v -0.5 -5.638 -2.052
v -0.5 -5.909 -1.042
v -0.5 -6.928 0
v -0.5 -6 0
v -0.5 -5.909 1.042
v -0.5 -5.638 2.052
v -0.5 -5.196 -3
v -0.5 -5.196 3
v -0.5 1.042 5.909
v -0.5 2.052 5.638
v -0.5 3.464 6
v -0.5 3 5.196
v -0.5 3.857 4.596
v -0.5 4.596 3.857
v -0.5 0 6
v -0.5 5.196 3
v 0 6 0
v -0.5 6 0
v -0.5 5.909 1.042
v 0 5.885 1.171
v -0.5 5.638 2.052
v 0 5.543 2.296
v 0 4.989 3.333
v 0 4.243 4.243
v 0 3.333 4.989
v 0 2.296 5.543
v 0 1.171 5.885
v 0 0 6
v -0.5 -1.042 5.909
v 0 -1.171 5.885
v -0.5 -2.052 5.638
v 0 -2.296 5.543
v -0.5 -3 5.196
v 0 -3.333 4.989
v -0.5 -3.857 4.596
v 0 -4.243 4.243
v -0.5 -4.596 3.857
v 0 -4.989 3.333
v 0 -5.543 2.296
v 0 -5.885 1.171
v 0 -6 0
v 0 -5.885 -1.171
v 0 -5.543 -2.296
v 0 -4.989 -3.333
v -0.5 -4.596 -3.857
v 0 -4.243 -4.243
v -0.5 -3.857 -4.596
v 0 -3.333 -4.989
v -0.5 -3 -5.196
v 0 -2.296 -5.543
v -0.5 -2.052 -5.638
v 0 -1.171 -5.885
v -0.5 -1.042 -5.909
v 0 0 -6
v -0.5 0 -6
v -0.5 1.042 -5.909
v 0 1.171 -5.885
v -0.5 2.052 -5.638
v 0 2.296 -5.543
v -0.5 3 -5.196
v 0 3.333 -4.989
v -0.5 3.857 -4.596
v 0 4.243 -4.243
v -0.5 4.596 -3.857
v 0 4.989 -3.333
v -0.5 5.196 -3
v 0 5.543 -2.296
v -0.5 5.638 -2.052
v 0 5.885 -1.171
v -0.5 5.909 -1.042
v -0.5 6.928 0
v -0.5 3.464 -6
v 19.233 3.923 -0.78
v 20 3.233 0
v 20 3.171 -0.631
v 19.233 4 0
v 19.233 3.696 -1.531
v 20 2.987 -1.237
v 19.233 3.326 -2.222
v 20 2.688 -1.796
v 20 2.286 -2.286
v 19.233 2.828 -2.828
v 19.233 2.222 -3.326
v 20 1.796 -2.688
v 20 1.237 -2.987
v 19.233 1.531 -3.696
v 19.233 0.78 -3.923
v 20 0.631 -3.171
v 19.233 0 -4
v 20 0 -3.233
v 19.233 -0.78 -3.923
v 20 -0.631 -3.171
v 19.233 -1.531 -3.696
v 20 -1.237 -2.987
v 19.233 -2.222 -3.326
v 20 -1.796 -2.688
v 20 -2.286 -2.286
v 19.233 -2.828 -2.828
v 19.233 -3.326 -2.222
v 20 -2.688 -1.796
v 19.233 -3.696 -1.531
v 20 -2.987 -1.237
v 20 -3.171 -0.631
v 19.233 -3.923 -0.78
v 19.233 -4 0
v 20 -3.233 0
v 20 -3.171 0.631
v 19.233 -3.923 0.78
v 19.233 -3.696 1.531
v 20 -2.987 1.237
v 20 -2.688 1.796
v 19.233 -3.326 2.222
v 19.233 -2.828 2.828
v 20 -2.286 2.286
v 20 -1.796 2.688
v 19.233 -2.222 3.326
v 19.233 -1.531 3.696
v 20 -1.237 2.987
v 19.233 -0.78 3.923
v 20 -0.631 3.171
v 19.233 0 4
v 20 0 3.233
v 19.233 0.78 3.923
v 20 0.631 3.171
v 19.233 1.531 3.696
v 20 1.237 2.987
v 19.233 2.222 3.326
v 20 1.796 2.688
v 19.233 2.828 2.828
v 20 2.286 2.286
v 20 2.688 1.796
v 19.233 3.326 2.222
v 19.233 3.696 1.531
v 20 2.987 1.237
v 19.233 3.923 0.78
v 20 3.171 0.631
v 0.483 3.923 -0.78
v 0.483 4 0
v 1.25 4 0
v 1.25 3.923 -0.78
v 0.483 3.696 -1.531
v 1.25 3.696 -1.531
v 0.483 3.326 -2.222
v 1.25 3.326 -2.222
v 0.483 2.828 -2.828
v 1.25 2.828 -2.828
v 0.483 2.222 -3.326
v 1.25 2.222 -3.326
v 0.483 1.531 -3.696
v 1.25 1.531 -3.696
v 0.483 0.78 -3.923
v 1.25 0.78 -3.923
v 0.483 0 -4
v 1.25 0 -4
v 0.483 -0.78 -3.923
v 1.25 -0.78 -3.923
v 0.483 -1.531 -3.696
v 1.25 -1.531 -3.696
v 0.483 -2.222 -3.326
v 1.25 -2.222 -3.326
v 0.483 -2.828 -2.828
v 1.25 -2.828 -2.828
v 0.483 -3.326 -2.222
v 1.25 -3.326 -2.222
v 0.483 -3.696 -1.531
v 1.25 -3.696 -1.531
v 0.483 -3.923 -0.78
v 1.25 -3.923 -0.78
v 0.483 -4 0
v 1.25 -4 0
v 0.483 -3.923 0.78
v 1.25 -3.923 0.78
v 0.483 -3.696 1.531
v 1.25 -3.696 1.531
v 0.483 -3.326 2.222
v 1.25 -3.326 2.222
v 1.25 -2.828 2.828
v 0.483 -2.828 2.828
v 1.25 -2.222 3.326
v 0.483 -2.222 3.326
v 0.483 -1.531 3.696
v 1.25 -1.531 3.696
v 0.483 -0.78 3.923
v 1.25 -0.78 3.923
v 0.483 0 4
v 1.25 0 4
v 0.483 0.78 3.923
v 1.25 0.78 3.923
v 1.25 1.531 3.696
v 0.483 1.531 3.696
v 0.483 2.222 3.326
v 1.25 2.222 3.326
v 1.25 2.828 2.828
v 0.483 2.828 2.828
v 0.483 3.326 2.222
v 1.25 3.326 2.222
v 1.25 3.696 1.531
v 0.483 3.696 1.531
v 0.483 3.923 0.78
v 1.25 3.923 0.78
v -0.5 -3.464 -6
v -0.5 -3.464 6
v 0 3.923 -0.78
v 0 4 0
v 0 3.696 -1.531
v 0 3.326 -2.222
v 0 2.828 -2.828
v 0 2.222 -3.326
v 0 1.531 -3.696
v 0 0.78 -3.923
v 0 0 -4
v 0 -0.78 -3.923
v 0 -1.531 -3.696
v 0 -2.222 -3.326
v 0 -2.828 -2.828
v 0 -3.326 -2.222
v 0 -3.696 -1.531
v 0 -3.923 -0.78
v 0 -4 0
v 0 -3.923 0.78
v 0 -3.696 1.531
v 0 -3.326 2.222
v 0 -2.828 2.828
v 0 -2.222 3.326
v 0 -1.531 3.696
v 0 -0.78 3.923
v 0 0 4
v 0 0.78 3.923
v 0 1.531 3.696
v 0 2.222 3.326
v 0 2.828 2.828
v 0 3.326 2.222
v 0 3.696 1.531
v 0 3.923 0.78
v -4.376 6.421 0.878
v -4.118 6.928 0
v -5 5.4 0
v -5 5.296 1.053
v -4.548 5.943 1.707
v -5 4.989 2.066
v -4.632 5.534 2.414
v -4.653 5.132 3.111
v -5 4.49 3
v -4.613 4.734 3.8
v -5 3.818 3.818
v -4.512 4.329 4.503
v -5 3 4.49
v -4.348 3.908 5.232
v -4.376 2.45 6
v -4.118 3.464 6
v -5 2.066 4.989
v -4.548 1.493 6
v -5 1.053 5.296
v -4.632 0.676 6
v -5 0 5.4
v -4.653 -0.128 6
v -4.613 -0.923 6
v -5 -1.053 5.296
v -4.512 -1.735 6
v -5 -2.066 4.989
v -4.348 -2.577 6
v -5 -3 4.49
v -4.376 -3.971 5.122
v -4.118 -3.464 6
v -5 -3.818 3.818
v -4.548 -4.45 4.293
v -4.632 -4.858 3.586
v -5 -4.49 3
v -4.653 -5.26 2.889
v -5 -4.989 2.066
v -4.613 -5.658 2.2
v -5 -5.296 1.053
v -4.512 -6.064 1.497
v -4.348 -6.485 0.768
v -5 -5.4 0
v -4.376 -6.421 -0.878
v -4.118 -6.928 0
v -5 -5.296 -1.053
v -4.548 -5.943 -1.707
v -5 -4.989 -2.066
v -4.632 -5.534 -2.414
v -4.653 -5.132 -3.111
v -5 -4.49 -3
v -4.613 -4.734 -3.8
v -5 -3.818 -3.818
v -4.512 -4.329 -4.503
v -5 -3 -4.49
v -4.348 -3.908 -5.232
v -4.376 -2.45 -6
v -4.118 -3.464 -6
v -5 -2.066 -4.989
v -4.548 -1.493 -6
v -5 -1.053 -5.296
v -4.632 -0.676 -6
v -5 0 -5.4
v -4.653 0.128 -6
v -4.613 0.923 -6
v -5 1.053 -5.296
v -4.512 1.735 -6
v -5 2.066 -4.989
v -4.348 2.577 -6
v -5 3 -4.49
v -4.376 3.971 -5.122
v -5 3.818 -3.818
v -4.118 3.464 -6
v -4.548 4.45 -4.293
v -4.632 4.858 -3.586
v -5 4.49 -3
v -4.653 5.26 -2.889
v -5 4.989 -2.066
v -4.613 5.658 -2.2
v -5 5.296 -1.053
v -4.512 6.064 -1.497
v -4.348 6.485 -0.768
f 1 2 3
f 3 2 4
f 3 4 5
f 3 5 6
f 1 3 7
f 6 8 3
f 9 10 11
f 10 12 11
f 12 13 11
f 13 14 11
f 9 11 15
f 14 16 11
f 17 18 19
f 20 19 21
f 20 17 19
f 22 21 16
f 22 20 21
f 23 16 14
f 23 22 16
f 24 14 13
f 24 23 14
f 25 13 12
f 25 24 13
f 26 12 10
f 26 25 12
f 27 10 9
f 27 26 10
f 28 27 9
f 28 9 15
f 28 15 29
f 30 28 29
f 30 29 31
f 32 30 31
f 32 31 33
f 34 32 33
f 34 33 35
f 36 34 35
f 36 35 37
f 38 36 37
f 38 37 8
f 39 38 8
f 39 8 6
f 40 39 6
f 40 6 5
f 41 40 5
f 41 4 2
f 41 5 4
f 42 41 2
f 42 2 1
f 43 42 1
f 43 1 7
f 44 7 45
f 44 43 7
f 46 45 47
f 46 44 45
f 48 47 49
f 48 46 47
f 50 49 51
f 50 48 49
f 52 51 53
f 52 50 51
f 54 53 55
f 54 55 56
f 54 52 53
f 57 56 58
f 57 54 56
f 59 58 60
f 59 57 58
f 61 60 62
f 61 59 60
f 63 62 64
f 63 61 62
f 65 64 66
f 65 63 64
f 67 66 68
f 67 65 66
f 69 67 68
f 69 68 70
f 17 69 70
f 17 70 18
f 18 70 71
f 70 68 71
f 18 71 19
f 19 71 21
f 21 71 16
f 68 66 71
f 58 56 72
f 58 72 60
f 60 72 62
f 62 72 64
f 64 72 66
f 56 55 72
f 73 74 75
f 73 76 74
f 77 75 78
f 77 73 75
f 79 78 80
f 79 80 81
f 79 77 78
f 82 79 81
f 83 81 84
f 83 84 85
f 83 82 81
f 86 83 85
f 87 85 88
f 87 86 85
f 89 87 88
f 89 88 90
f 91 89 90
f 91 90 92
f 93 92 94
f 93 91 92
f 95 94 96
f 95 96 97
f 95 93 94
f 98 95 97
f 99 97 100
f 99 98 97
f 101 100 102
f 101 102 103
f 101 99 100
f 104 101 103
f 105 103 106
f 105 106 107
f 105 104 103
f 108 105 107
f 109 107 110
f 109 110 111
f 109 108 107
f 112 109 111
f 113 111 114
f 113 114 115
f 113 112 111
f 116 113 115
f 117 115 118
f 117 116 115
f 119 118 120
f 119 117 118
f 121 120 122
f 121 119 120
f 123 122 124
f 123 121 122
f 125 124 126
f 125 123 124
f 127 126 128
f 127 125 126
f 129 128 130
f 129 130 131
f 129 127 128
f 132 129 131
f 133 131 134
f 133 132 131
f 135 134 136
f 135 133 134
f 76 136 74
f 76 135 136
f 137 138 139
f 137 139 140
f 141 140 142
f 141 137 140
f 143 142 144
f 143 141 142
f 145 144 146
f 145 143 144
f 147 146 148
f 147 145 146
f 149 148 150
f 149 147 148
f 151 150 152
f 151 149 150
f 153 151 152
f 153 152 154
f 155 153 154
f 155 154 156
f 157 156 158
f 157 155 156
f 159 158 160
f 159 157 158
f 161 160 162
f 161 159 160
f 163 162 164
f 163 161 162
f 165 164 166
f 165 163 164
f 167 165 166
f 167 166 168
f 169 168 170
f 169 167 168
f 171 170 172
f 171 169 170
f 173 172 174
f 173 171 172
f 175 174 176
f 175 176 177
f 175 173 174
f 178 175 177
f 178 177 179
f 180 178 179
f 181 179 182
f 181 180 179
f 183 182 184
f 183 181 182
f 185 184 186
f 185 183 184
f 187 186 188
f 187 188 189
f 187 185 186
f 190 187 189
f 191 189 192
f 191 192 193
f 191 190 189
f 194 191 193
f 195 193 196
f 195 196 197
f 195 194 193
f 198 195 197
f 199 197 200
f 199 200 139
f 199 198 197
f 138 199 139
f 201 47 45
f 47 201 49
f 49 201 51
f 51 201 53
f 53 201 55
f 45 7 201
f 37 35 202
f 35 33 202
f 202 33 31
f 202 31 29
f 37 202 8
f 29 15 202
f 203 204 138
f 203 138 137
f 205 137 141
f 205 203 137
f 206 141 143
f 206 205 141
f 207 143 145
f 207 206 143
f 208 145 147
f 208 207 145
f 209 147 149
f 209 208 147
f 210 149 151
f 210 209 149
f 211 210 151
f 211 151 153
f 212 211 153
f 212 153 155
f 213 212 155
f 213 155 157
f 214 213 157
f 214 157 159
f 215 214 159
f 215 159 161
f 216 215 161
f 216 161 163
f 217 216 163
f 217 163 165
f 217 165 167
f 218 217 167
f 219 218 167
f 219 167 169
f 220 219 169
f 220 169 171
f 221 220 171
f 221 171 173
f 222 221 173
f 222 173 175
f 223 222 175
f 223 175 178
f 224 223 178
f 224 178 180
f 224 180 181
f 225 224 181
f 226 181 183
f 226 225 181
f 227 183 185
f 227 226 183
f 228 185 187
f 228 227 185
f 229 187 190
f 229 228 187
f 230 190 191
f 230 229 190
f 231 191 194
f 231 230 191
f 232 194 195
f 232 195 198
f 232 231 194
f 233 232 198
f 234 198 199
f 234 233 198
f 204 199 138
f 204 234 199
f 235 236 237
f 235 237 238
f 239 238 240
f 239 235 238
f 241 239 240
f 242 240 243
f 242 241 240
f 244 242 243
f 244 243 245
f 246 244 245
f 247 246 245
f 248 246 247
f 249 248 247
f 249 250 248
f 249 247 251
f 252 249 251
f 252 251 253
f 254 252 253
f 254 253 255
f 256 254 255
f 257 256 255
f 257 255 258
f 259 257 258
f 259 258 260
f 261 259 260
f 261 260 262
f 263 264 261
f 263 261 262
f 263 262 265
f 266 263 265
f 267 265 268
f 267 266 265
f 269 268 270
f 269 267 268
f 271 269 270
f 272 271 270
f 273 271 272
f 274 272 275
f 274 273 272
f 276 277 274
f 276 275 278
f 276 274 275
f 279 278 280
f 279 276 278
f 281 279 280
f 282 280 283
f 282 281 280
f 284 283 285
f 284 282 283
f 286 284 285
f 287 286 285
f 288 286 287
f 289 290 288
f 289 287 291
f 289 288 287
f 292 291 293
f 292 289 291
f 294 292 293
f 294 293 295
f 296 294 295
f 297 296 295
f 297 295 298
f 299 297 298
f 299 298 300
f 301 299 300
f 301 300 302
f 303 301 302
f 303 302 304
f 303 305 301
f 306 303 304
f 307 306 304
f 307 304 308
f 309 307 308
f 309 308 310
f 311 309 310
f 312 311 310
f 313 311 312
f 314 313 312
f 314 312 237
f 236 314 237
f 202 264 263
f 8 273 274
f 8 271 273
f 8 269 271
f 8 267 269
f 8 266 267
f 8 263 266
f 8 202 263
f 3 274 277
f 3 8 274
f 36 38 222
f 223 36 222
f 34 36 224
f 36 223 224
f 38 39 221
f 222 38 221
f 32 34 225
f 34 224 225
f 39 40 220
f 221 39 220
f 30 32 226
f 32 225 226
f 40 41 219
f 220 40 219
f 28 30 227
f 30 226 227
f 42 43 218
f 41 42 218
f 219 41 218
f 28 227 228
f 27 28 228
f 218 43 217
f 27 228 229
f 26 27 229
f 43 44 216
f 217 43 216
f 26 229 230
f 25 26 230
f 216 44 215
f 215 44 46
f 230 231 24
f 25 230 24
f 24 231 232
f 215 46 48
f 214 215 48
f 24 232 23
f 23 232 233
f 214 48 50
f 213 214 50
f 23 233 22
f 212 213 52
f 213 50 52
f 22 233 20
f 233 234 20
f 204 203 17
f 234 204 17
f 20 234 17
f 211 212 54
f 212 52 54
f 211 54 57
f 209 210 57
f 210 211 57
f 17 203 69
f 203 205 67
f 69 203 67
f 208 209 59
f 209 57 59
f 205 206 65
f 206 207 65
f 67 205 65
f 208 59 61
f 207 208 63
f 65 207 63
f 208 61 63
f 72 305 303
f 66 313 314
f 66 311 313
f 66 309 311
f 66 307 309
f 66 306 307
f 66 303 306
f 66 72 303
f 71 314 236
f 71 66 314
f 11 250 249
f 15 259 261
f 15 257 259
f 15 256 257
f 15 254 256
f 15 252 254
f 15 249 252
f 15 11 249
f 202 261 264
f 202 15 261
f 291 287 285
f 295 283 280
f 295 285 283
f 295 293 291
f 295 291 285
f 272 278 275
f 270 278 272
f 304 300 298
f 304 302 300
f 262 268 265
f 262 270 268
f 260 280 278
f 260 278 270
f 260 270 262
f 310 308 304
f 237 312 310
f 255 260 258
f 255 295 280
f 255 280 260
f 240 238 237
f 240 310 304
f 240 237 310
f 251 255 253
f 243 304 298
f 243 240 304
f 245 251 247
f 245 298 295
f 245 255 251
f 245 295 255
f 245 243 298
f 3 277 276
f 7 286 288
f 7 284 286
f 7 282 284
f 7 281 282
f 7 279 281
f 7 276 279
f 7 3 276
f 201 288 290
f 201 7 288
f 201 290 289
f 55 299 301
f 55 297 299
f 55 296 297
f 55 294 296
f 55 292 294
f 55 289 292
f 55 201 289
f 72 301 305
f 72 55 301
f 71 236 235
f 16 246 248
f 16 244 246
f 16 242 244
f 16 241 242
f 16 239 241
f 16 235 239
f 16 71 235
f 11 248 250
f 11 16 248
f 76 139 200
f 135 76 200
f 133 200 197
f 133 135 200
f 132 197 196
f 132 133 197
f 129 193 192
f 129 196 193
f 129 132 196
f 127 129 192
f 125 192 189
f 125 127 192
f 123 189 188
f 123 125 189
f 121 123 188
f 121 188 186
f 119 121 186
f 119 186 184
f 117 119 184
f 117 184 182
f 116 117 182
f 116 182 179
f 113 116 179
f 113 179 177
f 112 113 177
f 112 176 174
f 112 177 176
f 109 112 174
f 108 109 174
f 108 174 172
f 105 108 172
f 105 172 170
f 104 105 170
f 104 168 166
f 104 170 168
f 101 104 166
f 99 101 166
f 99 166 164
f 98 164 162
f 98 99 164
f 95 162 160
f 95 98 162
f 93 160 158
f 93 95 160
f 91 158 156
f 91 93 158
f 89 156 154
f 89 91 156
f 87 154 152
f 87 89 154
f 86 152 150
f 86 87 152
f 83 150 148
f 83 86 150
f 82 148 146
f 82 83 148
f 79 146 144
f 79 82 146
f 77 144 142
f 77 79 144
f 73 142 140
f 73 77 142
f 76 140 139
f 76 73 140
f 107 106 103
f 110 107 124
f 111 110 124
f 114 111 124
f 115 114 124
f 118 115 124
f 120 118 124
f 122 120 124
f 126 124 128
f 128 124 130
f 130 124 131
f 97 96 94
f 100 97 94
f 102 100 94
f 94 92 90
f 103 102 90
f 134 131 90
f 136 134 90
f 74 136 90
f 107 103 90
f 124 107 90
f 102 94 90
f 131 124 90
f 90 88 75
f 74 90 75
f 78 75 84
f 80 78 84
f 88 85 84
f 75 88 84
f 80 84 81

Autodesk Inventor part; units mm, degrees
ref_plane "YZ Plane" through (0, 0, 0) normal (1, 0, 0) x (0, 1, 0)
ref_plane "XZ Plane" through (0, 0, 0) normal (0, 1, 0) x (-1, 0, 0)
sketch "Эскиз1" plane through (0, 0, 0) normal (0, 0, 1) x (1, 0, 0)
  line L0 (0, 6) -> (0, 4)
  line L1 (1.25, 4) -> (20, 4)
  line L2 (20, 4) -> (20, 0)
  line L3 (20, 0) -> (-0.5001, 0)
  line L4 (-4.6001, 0) -> (24.1, 0) projected
  line L5 (-0.5001, 0) -> (-0.5001, 6)
  line L6 (-0.5001, 6) -> (0, 6)
  line L7 (1.25, 4) -> (0.4831, 4)
  line L8 (0.4831, 4) -> (0, 4)
  line L9 (0, -1.2) -> (0, 7.2) projected
  dimension "d0" = 20
  dimension "d1" = 18.75
  dimension "d2" = 8
  dimension "d9" = 0.5001
  dimension "d10" = 12
  dimension "d13" = 0.7669
  dimension "d14" = 8
revolve "Базовый элемент" add sketch "Эскиз1" angle 360 about axis through (20, 0, 0) along (-1, 0, 0)
sketch "Эскиз2" plane through (-0.5001, 0, 0) normal (-1, 0, 0) x (0, 0, 1)
  line L0 (0, 6.9282) -> (6, 3.4641)
  line L1 (6, 3.4641) -> (6, -3.4641)
  line L2 (6, -3.4641) -> (0, -6.9282)
  line L3 (0, -6.9282) -> (-6, -3.4641)
  line L4 (-6, -3.4641) -> (-6, 3.4641)
  line L5 (-6, 3.4641) -> (0, 6.9282)
  point P0 (0, 0)
  point P1 (0, 0)
  dimension "d11" = 12
extrude "С головкой" add sketch "Эскиз2" along normal blind 4.5
sketch "Эскиз4" plane through (0, 0, 0) normal (0, 0, 1) x (1, 0, 0)
  line L0 (-5.0001, 5.4) -> (-5.0001, 6.9282)
  line L1 (-5.0001, 6.9282) -> (-4.1178, 6.9282)
  line L2 (-4.1178, 6.9282) -> (-5.0001, 5.4)
  line L3 (-5.9001, 0) -> (0.3999, 0) projected
  line L4 (-0.5001, 6.9282) -> (-5.0001, 6.9282) projected
  line L5 (-5.0001, 3.4641) -> (-5.0001, 6.9282) projected
  dimension "d5" = 30
  dimension "d19" = 10.8
revolve "Фаска1" cut sketch "Эскиз4" angle 360 about axis through (-10, 0, 0) along (1, 0, 0)
thread "Резьба" size "M8x1.25" class "6g" standard "ISO Metric profile" length 18.75
chamfer "Фаска2" distance 0.7668 distance2 0.7669 1 edges at (20, -4, 0) measured on face at (20, 1.3194, 0.8842)
ref_plane "Work Plane1" through (1.525, 0, 0) normal (0, 0, 1) x (1, 0, 0)
equation "\"d0\" = NLG"
equation "\"d1\" = GEL"
equation "\"d2\" = GD"
equation "\"d10\" = SD2"
equation "\"d14\" = BDM"
equation "\"d11\" = SW"
equation "\"d3\" = KOH - SD"
equation "\"d5\" = ANG1"
equation "\"d19\" = SW0"
equation "\"d15\" = GEL"
equation "\"d6\" = -0.5 * SPD + 0.5 * GD"
equation "\"NLG\" = 20"
equation "\"GD\" = NND"
equation "\"BDM\" = NND"
equation "\"KOH\" = 5"
equation "\"GEL\" = 18.75"
equation "\"SW\" = 12"
equation "\"SW0\" = 10.8"
equation "\"SPD\" = NND - 1.2269 * PTC"
equation "\"SD2\" = SW"
equation "\"SD\" = 0.5"
equation "\"ANG1\" = 30deg"
equation "\"GAL\" = 0.61345 * PTC"
equation "\"GUL\" = 0.61345 * PTC"
equation "\"RR\" = 0.1"
equation "\"GD1\" = THREADDIA - 1.2269 * PTC"
equation "\"THREADDIA\" = 8"
equation "\"TOA\" = 30deg"
equation "\"PTC\" = 1.25"
equation "\"NND\" = 8"
equation "\"E0\" = 1.155 * SW"
properties part number "Болт M8-6gx20 ГОСТ 7808-70" material "Сталь, мягкая"
